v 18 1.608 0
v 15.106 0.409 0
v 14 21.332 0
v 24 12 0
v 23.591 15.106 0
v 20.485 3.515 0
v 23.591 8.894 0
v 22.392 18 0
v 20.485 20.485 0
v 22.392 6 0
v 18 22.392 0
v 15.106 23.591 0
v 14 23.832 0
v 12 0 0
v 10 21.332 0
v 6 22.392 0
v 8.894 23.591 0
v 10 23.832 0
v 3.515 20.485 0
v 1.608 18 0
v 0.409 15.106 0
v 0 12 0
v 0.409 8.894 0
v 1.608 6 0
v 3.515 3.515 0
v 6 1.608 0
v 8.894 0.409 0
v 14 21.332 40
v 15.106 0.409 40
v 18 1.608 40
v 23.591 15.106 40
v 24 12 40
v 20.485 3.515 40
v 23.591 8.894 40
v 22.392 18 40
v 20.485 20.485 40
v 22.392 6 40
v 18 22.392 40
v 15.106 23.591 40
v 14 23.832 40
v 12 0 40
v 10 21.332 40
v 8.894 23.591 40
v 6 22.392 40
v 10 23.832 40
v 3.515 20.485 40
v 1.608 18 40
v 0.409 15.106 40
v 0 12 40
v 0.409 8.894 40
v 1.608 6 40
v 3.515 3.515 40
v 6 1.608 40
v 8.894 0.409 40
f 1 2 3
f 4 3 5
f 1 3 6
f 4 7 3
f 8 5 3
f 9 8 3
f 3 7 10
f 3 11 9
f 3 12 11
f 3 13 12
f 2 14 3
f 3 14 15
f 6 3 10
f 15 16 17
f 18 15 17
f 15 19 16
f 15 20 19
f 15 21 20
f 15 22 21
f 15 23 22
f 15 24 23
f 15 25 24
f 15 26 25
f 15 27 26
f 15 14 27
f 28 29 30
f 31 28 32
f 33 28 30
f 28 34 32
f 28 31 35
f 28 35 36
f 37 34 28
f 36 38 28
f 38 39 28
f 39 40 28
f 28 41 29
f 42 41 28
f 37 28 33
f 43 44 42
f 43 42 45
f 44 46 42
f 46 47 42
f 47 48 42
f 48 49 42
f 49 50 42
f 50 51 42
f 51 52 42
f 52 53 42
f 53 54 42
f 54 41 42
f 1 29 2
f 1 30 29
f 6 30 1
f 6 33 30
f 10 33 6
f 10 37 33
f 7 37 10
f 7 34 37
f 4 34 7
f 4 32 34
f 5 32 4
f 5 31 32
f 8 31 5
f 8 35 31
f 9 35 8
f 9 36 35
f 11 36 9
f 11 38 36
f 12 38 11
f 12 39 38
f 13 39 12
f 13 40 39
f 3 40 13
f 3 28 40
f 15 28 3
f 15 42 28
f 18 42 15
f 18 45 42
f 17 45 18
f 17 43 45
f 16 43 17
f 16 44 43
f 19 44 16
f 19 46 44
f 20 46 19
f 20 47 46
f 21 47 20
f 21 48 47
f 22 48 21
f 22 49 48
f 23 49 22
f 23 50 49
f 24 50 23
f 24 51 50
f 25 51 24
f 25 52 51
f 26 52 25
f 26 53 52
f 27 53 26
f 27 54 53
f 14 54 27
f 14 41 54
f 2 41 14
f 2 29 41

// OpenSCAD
$fn = 32;

// ----------------------------------------------------------------------
// Keyway shaft: d24 shaft, key 4 x 2.5 mm
// ----------------------------------------------------------------------

// --- parameters (mm) ---
shaft_r = 12;             // shaft radius
key_w = 4;                // keyway width
key_d = 2.5;              // keyway depth below the surface line
plate_t = 40;             // shaft length, Z (extrusion height)
fit_tol = 0.1;            // declared fit tolerance (prompt contract)
free_tol = 0.5;           // declared free tolerance (prompt contract)

shaft_d = 2 * shaft_r;  // shaft diameter
circle_step = 15;  // polygon sampling step, degrees

profile = [[8.894, 23.591], [6, 22.392], [3.515, 20.485], [1.608, 18], [0.409, 15.106], [0, 12], [0.409, 8.894], [1.608, 6], [3.515, 3.515], [6, 1.608], [8.894, 0.409], [12, 0], [15.106, 0.409], [18, 1.608], [20.485, 3.515], [22.392, 6], [23.591, 8.894], [24, 12], [23.591, 15.106], [22.392, 18], [20.485, 20.485], [18, 22.392], [15.106, 23.591], [14, 23.832], [14, 21.332], [10, 21.332], [10, 23.832]];  // primary outline, 27 points, counter clockwise

// --- the one profile operation ---
linear_extrude(height = plate_t) polygon(points = profile);
